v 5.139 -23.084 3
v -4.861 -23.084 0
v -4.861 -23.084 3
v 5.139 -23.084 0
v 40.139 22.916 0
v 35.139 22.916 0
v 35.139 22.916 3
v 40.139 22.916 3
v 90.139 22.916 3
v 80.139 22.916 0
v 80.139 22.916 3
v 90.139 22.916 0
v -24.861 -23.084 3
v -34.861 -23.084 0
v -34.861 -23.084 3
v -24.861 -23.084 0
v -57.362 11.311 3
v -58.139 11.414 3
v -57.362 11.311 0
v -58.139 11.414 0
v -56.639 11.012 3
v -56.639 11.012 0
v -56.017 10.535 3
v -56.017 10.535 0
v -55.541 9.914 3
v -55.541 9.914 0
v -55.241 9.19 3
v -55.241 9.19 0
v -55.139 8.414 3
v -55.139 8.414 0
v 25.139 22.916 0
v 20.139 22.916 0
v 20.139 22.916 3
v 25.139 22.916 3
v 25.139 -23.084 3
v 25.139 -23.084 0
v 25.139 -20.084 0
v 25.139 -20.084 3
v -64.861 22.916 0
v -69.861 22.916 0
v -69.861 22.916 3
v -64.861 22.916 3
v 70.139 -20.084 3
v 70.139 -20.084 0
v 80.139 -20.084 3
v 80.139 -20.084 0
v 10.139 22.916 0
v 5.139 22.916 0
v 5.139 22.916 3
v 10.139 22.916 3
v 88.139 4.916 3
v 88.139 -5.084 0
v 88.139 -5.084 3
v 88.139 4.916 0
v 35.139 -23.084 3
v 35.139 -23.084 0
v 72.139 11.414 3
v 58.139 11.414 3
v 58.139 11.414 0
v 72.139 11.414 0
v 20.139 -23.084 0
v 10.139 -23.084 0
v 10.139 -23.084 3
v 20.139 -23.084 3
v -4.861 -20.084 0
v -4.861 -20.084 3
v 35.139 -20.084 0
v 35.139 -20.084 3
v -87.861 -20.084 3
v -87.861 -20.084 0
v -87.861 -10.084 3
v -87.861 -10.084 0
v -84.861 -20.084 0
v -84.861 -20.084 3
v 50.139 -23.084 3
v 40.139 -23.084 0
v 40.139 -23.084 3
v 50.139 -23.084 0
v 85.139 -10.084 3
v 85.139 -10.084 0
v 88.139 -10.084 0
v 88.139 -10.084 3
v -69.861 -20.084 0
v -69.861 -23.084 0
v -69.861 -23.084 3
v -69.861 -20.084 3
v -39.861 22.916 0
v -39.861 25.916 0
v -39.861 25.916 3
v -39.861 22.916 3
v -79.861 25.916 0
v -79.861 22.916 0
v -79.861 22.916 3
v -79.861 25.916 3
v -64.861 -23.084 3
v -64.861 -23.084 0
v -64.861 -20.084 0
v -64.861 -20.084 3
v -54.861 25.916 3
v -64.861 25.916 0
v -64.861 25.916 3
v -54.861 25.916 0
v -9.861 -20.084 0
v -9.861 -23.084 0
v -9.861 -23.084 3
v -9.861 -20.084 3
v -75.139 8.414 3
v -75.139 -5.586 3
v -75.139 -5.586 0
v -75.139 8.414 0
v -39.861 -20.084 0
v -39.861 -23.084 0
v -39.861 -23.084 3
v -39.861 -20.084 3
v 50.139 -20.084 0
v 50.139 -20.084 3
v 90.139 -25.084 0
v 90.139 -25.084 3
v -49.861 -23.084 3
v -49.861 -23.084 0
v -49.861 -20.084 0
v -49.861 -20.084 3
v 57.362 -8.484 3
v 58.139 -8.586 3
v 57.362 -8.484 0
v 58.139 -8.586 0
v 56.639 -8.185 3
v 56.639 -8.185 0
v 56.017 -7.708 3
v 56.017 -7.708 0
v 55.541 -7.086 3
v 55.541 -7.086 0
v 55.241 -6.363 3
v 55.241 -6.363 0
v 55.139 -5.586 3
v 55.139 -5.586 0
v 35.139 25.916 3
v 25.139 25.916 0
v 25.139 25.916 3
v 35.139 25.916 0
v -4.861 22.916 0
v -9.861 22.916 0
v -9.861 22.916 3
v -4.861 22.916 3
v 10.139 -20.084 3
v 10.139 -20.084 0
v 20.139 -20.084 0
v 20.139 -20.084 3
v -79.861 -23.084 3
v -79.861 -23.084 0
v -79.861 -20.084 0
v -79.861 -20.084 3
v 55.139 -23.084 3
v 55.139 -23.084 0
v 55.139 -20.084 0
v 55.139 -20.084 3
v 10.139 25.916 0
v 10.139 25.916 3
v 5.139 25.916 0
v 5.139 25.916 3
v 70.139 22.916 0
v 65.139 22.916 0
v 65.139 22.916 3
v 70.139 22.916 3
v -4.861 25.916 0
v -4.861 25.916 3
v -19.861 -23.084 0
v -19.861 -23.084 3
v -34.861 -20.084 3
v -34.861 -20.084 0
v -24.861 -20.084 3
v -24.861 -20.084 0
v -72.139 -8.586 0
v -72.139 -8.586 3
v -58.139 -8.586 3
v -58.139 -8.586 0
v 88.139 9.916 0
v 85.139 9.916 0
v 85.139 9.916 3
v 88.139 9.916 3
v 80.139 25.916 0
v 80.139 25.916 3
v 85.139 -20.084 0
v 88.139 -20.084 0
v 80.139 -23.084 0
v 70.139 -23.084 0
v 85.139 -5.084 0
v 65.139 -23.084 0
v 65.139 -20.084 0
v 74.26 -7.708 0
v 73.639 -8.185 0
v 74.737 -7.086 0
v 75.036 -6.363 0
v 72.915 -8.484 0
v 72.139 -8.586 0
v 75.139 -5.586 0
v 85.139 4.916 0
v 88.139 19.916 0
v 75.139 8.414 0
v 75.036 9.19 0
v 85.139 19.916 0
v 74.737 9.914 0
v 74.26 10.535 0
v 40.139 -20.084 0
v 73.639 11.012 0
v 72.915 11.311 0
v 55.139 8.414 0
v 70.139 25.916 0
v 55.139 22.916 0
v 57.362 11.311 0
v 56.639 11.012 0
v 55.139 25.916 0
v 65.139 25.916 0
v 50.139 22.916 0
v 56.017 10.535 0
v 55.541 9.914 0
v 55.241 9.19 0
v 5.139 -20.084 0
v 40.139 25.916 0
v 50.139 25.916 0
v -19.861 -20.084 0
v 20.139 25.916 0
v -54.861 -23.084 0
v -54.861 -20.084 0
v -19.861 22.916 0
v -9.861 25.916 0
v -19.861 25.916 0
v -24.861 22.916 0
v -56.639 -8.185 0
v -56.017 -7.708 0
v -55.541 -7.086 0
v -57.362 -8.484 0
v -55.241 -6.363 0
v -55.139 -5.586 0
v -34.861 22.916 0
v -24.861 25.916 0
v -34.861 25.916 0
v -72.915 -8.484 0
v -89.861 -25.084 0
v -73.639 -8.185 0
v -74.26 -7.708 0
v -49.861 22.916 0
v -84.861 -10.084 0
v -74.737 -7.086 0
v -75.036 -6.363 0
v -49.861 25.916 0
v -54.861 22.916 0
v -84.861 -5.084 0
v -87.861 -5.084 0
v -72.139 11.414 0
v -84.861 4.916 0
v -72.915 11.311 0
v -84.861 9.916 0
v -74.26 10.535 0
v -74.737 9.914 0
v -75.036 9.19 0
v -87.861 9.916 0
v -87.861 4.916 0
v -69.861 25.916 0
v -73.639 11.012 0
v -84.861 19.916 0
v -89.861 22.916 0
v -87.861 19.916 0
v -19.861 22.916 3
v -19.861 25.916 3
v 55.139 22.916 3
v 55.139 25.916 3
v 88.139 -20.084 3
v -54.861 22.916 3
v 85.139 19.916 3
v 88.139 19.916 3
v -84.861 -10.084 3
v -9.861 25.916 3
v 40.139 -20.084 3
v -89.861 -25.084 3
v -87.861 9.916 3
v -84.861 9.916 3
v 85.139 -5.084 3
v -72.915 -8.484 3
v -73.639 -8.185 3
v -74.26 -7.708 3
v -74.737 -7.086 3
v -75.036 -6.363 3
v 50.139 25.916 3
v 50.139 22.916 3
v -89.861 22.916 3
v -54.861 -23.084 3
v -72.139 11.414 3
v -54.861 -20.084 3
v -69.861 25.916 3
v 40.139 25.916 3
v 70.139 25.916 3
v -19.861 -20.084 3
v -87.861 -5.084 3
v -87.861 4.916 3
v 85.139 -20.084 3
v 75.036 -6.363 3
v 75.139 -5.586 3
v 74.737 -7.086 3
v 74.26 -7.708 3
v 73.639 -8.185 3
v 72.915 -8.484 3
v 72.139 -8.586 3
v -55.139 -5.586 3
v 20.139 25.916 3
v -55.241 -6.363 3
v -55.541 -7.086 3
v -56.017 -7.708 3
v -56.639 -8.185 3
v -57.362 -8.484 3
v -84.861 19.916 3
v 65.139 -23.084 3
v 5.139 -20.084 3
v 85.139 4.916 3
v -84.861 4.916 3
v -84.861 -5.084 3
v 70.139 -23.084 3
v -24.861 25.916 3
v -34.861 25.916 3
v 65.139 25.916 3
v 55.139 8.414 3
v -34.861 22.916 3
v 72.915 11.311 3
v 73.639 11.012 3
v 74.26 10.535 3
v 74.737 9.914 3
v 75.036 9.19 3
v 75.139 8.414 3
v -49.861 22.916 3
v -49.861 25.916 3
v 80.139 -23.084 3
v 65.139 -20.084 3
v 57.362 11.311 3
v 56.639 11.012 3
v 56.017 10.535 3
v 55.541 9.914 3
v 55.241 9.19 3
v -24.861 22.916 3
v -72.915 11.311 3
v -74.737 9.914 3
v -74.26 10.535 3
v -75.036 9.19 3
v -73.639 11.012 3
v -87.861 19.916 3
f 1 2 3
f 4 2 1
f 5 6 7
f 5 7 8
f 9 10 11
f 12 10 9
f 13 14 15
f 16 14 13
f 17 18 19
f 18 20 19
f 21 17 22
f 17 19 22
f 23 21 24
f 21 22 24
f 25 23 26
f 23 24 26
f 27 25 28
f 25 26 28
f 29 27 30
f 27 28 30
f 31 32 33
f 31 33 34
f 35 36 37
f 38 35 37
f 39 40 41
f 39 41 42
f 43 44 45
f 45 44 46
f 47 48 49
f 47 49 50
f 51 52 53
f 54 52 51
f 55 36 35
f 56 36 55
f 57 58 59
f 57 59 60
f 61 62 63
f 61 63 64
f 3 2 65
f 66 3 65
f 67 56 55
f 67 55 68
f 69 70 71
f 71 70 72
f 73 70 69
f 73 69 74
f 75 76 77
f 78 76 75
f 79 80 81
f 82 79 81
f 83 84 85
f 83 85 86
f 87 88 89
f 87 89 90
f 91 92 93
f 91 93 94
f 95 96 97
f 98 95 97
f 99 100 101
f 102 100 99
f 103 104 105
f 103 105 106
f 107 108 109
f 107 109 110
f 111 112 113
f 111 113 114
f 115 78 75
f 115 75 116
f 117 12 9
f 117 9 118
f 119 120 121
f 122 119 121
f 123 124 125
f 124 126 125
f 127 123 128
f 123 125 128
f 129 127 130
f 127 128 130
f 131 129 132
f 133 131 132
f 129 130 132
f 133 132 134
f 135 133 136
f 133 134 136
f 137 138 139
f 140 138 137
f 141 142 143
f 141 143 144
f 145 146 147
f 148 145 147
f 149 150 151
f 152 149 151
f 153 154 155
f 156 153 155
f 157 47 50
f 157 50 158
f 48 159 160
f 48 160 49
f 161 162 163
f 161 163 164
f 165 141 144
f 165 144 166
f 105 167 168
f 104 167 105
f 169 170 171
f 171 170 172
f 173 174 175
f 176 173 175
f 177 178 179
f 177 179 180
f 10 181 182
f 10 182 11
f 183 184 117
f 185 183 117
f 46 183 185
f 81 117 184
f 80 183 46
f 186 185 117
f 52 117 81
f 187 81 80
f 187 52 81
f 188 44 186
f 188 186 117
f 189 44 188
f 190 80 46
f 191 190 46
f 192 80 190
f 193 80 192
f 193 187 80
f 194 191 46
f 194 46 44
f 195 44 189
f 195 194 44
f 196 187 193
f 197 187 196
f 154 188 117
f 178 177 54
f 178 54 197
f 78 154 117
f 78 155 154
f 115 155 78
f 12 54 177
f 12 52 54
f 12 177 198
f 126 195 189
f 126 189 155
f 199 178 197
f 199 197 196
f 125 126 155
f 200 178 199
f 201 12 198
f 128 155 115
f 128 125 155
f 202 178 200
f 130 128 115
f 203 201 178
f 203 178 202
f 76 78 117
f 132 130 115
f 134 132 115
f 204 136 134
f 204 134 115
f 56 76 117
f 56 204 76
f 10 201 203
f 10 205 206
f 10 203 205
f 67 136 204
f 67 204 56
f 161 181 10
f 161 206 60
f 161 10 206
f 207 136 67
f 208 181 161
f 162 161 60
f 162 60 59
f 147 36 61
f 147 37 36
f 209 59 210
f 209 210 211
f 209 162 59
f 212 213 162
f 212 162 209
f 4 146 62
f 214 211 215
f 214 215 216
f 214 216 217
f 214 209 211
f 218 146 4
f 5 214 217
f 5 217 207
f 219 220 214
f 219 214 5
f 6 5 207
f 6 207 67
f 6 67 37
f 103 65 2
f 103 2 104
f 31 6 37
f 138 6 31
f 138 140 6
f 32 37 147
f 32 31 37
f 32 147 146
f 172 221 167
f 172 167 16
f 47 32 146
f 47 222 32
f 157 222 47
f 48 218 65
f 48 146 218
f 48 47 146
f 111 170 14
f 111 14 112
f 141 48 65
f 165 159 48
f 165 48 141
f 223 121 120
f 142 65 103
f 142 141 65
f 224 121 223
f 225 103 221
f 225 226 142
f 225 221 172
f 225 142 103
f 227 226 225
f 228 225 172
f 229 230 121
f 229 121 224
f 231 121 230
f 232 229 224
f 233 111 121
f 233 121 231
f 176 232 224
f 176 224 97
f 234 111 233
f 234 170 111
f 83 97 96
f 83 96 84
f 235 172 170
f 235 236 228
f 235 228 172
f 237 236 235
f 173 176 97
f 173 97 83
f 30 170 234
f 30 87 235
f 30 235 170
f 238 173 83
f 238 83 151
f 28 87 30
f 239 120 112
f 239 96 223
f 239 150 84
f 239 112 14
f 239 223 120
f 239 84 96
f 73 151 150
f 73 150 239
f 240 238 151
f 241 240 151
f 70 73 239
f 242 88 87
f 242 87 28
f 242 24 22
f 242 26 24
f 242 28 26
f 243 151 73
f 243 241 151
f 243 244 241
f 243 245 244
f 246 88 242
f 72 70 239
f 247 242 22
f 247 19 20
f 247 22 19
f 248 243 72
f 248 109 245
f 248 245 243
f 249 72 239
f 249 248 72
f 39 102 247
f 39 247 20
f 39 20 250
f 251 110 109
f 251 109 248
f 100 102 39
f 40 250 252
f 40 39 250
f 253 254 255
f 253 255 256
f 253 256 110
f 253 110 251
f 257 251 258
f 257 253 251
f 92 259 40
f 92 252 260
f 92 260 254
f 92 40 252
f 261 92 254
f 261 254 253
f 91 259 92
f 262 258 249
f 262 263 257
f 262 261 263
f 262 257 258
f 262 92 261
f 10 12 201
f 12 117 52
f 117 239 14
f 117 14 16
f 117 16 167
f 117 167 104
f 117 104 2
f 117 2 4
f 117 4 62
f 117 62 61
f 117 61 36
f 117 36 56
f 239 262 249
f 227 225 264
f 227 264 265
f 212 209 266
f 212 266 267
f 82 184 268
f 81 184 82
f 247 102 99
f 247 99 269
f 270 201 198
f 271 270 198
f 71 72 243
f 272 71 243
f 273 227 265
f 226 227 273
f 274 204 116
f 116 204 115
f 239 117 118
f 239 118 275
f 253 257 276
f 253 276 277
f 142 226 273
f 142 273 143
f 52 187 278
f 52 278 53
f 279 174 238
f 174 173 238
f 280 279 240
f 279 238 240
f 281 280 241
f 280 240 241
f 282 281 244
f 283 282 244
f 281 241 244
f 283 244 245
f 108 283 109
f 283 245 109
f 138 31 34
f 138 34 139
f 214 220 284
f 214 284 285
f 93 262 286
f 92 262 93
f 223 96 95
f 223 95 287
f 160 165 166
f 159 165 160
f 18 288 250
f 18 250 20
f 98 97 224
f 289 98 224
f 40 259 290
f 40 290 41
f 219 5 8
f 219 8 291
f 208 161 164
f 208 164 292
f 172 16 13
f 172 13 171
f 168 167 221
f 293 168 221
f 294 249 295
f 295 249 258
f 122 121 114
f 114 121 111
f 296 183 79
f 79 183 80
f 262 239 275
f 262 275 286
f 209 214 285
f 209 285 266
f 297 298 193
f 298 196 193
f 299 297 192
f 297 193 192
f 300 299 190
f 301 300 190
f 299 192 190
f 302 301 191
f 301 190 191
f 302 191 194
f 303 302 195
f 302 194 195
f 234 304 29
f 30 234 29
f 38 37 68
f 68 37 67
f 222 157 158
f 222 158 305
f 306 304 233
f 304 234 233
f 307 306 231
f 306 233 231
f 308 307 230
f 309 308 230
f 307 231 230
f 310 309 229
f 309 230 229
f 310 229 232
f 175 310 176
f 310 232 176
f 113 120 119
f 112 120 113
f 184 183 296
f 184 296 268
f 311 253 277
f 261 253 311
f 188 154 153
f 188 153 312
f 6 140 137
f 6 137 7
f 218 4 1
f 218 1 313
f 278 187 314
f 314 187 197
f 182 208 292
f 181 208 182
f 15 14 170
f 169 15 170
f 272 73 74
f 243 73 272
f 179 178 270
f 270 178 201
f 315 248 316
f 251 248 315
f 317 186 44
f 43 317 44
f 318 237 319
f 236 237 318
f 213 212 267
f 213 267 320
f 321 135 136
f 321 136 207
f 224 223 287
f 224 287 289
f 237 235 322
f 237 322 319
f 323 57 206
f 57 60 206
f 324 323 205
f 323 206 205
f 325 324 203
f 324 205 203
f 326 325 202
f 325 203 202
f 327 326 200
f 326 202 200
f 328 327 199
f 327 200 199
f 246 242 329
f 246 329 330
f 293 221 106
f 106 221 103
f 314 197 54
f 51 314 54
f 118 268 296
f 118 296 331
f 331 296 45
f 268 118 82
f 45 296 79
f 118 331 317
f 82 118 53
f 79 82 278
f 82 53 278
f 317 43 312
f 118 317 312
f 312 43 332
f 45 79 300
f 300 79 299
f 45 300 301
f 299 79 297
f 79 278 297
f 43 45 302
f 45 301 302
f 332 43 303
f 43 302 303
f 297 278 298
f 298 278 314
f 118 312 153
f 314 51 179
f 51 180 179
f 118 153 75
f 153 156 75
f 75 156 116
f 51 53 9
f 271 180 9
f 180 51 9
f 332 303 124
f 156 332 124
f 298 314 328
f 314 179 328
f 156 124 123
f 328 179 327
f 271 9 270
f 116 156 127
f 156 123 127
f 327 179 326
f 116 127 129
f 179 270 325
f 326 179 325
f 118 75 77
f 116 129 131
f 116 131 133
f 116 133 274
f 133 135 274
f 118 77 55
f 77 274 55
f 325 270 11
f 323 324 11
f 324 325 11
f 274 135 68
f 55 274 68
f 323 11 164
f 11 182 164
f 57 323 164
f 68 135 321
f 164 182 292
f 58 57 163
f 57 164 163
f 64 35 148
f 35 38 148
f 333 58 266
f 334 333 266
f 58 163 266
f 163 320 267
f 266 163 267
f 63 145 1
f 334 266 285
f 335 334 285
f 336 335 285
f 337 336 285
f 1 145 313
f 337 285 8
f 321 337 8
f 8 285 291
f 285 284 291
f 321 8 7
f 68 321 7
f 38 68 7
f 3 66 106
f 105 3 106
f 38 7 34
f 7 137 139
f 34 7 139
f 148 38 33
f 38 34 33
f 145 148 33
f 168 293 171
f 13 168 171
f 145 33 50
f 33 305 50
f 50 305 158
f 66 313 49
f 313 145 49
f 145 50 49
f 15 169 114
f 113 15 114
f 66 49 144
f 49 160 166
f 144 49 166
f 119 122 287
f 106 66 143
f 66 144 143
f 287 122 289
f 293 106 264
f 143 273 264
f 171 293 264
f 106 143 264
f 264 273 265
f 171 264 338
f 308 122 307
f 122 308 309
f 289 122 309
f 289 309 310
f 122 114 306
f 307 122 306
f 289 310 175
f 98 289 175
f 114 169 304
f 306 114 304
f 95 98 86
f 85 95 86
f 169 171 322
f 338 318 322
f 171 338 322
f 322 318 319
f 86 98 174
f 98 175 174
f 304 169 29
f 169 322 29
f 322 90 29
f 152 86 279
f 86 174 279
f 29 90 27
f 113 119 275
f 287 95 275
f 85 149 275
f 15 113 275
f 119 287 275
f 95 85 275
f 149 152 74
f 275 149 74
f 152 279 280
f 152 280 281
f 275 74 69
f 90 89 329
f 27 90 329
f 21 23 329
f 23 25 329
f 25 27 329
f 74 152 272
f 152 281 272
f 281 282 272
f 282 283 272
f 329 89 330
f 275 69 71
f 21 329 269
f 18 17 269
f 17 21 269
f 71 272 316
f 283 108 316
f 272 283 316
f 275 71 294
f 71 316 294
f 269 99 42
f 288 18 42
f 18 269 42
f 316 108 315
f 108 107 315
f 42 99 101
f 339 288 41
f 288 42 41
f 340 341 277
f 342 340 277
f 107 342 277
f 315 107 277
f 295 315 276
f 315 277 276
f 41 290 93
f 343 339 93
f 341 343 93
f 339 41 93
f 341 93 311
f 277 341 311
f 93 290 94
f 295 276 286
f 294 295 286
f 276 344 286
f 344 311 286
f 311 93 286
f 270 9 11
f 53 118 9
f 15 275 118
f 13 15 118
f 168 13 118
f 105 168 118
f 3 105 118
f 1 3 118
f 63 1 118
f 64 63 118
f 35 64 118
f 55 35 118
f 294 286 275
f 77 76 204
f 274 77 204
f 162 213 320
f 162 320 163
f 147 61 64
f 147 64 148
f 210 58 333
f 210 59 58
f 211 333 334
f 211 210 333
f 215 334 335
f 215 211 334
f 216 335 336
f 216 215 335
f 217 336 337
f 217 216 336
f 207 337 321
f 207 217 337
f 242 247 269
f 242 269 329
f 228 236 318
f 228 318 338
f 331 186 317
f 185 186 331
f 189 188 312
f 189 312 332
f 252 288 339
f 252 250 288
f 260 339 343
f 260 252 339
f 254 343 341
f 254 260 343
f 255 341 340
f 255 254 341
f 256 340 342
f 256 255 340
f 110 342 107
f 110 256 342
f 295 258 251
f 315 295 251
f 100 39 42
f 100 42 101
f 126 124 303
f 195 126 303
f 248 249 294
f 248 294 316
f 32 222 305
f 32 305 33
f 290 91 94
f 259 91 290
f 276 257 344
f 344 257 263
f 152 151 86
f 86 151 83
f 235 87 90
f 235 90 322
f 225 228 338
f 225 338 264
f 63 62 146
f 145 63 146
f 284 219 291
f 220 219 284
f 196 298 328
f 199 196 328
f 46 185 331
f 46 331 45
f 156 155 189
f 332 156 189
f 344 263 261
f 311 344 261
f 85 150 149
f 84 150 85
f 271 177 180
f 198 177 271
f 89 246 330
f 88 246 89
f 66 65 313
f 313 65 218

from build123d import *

# Parameters (mm, degrees)
SKETCH_1_W          = 3
SKETCH_1_H          = 10
SKETCH_1_W_2        = 10
SKETCH_1_H_2        = 3
EXTRUDE_1_DEPTH     = 3
SKETCH_2_W          = 20
SKETCH_2_H          = 20
CUT_EXTRUDE_1_DEPTH = 10
FILLET_1_R          = 3


with BuildPart() as part:
    # 草图1 → 凸台-拉伸1 (new body)
    with BuildSketch(Plane.XY):
        Polygon((-89.861316177, 22.916051468), (-79.861316177, 22.916051468), (-79.861316177, 25.916051468), (-69.861316177, 25.916051468), (-69.861316177, 22.916051468), (-64.861316177, 22.916051468), (-64.861316177, 25.916051468), (-54.861316177, 25.916051468), (-54.861316177, 22.916051468), (-49.861316177, 22.916051468), (-49.861316177, 25.916051468), (-39.861316177, 25.916051468), (-39.861316177, 22.916051468), (-34.861316177, 22.916051468), (-34.861316177, 25.916051468), (-24.861316177, 25.916051468), (-24.861316177, 22.916051468), (-19.861316177, 22.916051468), (-19.861316177, 25.916051468), (-9.861316177, 25.916051468), (-9.861316177, 22.916051468), (-4.861316177, 22.916051468), (-4.861316177, 25.916051468), (5.138683823, 25.916051468), (5.138683823, 22.916051468), (10.138683823, 22.916051468), (10.138683823, 25.916051468), (20.138683823, 25.916051468), (20.138683823, 22.916051468), (25.138683823, 22.916051468), (25.138683823, 25.916051468), (35.138683823, 25.916051468), (35.138683823, 22.916051468), (40.138683823, 22.916051468), (40.138683823, 25.916051468), (50.138683823, 25.916051468), (50.138683823, 22.916051468), (55.138683823, 22.916051468), (55.138683823, 25.916051468), (65.138683823, 25.916051468), (65.138683823, 22.916051468), (70.138683823, 22.916051468), (70.138683823, 25.916051468), (80.138683823, 25.916051468), (80.138683823, 22.916051468), (90.138683823, 22.916051468), (90.138683823, -25.083948532), (-89.861316177, -25.083948532), align=None)
        with Locations((-86.361316177, -0.083948532)):
            Rectangle(SKETCH_1_W, SKETCH_1_H, mode=Mode.SUBTRACT)
        with Locations((-86.361316177, 14.916051468)):
            Rectangle(SKETCH_1_W, SKETCH_1_H, mode=Mode.SUBTRACT)
        with Locations((-86.361316177, -15.083948532)):
            Rectangle(SKETCH_1_W, SKETCH_1_H, mode=Mode.SUBTRACT)
        with Locations((86.638683823, -15.083948532)):
            Rectangle(SKETCH_1_W, SKETCH_1_H, mode=Mode.SUBTRACT)
        with Locations((86.638683823, -0.083948532)):
            Rectangle(SKETCH_1_W, SKETCH_1_H, mode=Mode.SUBTRACT)
        with Locations((86.638683823, 14.916051468)):
            Rectangle(SKETCH_1_W, SKETCH_1_H, mode=Mode.SUBTRACT)
        with Locations((-59.861316177, -21.583948532)):
            Rectangle(SKETCH_1_W_2, SKETCH_1_H_2, mode=Mode.SUBTRACT)
        with Locations((-74.861316177, -21.583948532)):
            Rectangle(SKETCH_1_W_2, SKETCH_1_H_2, mode=Mode.SUBTRACT)
        with Locations((-44.861316177, -21.583948532)):
            Rectangle(SKETCH_1_W_2, SKETCH_1_H_2, mode=Mode.SUBTRACT)
        with Locations((-29.861316177, -21.583948532)):
            Rectangle(SKETCH_1_W_2, SKETCH_1_H_2, mode=Mode.SUBTRACT)
        with Locations((-14.861316177, -21.583948532)):
            Rectangle(SKETCH_1_W_2, SKETCH_1_H_2, mode=Mode.SUBTRACT)
        with Locations((0.138683823, -21.583948532)):
            Rectangle(SKETCH_1_W_2, SKETCH_1_H_2, mode=Mode.SUBTRACT)
        with Locations((15.138683823, -21.583948532)):
            Rectangle(SKETCH_1_W_2, SKETCH_1_H_2, mode=Mode.SUBTRACT)
        with Locations((30.138683823, -21.583948532)):
            Rectangle(SKETCH_1_W_2, SKETCH_1_H_2, mode=Mode.SUBTRACT)
        with Locations((45.138683823, -21.583948532)):
            Rectangle(SKETCH_1_W_2, SKETCH_1_H_2, mode=Mode.SUBTRACT)
        with Locations((60.138683823, -21.583948532)):
            Rectangle(SKETCH_1_W_2, SKETCH_1_H_2, mode=Mode.SUBTRACT)
        with Locations((75.138683823, -21.583948532)):
            Rectangle(SKETCH_1_W_2, SKETCH_1_H_2, mode=Mode.SUBTRACT)
    extrude(amount=EXTRUDE_1_DEPTH)

    # 草图2 → 切除-拉伸1 (cut)
    with BuildSketch(Plane.XY.offset(3)):
        with Locations((65.138683823, 1.413515523)):
            Rectangle(SKETCH_2_W, SKETCH_2_H)
        with Locations((-65.138683823, 1.413515523)):
            Rectangle(SKETCH_2_W, SKETCH_2_H)
    extrude(amount=-CUT_EXTRUDE_1_DEPTH, mode=Mode.SUBTRACT)

    # 圆角1
    fillet_1_edges = [part.edges().sort_by_distance(p)[0] for p in [
        (75.138683823, 11.413515523, 1.5),
        (75.138683823, -8.586484477, 1.5),
        (55.138683823, -8.586484477, 1.5),
        (55.138683823, 11.413515523, 1.5),
        (-55.138683823, 11.413515523, 1.5),
        (-55.138683823, -8.586484477, 1.5),
        (-75.138683823, -8.586484477, 1.5),
        (-75.138683823, 11.413515523, 1.5),
    ]]
    fillet(fillet_1_edges, radius=FILLET_1_R)


solid = part.part
